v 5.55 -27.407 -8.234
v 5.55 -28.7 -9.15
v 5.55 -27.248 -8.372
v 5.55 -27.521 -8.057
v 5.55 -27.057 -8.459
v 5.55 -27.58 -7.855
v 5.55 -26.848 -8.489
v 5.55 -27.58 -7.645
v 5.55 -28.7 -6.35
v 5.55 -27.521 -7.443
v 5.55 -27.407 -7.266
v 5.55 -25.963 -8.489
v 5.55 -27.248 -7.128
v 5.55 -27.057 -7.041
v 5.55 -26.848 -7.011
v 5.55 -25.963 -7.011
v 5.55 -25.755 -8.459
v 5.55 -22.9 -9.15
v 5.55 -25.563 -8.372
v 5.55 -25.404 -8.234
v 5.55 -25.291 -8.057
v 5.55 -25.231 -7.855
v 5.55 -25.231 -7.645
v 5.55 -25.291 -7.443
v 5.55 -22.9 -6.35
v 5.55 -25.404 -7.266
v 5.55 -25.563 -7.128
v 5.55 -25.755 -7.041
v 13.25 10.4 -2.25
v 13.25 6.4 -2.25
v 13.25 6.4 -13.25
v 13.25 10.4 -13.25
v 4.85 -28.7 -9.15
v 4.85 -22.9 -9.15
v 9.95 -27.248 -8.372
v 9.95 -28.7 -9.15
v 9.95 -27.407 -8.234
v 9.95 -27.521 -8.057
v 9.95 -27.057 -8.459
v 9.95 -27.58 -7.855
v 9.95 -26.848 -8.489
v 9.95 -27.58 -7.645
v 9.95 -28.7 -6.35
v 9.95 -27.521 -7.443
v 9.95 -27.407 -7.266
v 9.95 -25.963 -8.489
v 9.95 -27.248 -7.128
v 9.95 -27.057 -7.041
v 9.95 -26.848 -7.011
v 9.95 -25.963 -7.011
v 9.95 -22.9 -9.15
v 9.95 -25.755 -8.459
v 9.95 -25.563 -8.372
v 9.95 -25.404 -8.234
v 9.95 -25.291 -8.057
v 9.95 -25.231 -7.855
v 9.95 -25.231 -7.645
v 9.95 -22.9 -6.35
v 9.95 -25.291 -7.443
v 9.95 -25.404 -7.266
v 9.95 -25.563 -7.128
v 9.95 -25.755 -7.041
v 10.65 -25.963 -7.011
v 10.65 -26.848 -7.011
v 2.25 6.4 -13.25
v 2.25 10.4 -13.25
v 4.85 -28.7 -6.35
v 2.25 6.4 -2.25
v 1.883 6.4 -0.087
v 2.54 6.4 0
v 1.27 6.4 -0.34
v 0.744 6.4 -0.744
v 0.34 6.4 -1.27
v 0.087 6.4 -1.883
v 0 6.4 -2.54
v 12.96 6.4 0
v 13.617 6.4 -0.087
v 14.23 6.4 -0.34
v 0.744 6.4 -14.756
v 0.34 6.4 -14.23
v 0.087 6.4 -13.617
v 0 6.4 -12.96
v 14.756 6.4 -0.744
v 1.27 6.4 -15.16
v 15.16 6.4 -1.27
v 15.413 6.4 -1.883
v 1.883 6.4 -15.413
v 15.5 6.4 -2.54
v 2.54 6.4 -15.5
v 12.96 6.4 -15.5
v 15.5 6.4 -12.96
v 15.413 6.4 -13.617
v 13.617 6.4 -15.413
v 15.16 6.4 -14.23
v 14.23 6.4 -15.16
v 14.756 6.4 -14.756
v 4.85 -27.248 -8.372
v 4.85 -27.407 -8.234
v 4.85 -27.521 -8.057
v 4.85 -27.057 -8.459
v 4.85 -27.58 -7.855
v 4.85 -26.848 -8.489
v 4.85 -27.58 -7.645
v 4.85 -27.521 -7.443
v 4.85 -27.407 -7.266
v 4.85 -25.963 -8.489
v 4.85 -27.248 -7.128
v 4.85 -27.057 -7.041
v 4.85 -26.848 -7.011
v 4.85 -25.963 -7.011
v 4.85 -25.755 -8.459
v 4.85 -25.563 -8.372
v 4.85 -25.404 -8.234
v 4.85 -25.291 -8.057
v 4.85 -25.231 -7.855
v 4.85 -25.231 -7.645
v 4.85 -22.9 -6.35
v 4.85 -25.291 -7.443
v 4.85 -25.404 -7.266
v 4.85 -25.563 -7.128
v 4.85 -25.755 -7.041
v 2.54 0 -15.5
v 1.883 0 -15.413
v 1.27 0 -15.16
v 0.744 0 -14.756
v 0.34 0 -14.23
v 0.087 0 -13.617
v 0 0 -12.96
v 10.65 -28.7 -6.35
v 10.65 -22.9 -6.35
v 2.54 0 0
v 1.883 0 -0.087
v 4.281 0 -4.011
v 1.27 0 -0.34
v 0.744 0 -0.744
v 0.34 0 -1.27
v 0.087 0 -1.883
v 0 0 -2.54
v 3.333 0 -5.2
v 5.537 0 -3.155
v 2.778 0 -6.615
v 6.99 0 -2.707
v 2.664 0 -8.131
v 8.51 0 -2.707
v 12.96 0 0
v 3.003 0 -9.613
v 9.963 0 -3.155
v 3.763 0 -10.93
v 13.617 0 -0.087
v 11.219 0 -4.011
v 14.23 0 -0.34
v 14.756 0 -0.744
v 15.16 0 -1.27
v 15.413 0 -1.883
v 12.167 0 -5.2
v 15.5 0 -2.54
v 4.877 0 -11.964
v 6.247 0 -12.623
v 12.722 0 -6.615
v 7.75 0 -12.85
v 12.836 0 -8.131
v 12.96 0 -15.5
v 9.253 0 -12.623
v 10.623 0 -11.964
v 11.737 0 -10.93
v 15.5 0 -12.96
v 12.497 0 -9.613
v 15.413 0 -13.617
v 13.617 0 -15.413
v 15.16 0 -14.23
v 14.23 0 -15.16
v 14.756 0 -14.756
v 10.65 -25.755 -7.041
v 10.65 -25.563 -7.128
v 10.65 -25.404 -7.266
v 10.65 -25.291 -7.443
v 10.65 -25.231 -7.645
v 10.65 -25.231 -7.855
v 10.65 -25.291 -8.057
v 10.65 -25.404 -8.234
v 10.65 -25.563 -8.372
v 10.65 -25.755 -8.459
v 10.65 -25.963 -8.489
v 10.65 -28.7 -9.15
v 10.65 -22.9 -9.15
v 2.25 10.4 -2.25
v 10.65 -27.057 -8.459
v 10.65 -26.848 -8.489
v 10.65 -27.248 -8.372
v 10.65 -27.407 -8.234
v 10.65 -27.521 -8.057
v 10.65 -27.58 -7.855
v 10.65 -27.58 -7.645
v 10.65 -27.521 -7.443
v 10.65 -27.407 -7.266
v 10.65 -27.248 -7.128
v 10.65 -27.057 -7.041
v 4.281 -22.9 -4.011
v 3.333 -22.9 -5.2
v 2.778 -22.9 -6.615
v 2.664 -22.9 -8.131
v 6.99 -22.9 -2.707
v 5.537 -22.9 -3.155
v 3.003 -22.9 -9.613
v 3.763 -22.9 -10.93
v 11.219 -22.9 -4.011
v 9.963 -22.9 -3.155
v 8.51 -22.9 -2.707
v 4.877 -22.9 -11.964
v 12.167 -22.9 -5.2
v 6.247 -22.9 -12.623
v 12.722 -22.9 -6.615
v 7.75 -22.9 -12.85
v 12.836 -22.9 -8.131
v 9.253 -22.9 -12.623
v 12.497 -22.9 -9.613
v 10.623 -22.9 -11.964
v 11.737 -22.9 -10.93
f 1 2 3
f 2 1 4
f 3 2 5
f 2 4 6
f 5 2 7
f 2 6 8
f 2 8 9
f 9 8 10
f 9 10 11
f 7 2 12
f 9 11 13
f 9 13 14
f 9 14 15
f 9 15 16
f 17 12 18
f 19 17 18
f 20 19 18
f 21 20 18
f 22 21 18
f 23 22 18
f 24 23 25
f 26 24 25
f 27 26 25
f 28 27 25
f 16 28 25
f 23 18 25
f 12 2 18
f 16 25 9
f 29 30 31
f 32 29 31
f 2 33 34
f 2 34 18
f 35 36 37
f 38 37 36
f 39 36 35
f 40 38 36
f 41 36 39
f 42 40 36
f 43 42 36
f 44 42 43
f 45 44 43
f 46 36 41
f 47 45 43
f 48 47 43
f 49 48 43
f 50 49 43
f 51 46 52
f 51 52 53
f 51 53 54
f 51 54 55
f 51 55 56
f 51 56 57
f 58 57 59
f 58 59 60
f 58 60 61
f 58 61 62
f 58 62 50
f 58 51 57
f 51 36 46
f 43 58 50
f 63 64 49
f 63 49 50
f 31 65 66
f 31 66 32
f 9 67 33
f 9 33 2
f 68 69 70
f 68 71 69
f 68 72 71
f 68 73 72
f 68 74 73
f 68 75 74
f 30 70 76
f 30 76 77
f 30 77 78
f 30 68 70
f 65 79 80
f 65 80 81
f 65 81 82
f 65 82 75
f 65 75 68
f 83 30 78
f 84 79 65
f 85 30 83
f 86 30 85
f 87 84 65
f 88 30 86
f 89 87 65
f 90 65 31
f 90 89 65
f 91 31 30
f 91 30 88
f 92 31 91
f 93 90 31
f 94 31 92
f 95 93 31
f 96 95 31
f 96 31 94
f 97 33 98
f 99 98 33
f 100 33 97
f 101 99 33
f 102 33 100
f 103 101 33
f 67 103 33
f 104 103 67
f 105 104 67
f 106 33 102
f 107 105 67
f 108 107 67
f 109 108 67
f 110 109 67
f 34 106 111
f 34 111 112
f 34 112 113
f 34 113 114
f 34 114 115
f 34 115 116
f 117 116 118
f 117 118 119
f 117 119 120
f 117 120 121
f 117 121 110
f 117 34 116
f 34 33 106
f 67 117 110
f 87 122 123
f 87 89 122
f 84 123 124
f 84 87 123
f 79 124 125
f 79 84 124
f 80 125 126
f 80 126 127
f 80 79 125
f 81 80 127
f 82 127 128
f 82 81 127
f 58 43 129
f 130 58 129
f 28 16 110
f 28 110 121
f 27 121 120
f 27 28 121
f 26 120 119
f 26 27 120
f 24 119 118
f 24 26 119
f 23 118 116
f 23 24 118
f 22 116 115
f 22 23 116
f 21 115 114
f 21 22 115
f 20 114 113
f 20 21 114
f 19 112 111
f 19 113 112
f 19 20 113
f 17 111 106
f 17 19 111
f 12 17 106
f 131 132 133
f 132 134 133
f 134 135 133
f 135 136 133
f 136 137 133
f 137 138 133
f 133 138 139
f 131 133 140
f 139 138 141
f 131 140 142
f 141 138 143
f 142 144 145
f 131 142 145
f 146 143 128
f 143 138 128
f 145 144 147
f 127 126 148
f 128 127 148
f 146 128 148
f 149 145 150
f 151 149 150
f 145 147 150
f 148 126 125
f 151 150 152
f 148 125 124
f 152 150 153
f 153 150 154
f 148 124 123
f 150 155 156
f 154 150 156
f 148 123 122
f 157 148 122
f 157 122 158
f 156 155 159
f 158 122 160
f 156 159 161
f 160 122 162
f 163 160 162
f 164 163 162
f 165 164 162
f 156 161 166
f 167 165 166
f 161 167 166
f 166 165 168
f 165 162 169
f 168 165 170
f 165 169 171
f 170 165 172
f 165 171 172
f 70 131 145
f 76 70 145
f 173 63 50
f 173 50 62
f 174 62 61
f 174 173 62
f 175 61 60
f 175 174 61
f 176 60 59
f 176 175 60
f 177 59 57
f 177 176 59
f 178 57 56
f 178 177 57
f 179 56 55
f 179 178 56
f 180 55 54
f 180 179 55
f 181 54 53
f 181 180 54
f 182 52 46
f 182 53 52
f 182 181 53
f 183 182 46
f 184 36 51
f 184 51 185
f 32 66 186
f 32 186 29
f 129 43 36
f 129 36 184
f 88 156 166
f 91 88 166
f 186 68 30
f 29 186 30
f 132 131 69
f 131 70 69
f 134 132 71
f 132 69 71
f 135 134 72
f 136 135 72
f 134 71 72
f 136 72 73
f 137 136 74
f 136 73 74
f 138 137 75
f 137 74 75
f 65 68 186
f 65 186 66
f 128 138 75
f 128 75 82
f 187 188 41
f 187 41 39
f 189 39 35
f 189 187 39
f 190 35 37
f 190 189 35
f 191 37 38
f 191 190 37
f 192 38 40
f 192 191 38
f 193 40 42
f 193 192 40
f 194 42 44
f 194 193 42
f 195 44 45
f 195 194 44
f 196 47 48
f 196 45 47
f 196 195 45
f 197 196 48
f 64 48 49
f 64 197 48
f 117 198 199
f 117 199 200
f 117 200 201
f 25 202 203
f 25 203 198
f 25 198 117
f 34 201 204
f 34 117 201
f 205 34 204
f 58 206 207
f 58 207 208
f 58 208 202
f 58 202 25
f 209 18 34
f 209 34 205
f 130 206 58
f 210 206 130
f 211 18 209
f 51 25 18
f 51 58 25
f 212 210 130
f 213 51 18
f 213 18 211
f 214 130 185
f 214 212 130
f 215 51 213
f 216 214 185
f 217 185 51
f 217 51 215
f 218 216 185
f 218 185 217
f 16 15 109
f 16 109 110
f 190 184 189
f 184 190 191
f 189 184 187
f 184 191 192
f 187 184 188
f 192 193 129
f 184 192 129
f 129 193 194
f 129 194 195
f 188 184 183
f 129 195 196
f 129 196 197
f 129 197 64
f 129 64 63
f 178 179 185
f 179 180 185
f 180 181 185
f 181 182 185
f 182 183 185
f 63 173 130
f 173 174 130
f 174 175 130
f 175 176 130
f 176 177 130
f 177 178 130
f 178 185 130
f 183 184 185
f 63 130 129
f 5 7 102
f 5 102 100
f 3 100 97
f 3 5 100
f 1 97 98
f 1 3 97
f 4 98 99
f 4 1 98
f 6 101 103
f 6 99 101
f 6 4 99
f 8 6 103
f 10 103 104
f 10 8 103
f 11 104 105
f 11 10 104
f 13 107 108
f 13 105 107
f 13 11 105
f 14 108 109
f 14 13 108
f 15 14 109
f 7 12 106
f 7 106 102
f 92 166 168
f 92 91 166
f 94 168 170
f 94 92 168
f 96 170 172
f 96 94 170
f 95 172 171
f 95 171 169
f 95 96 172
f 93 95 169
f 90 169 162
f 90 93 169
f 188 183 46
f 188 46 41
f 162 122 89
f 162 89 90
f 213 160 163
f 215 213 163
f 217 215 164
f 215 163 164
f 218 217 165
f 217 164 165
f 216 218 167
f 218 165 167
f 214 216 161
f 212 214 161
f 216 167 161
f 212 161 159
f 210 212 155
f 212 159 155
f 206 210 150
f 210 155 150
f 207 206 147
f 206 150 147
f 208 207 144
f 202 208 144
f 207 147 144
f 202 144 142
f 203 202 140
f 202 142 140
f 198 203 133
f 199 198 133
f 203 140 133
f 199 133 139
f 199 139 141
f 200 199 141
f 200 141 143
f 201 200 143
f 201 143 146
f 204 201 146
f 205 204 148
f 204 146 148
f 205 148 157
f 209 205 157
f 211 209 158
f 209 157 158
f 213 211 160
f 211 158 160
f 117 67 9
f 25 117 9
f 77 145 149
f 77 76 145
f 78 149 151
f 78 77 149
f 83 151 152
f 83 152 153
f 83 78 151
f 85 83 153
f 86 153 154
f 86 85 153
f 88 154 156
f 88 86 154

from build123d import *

# Parameters (mm, degrees)
SKETCH1_W           = 15.5
SKETCH1_H           = 15.5
BOSS_EXTRUDE1_DEPTH = 6.4
FILLET1_R           = 2.54
FILLET2_R           = 2.54
FILLET3_R           = 2.54
FILLET4_R           = 2.54
SKETCH2_W           = 11
SKETCH2_H           = 11
BOSS_EXTRUDE2_DEPTH = 4
SKETCH3_R           = 5.1
BOSS_EXTRUDE3_DEPTH = 22.9
SKETCH4_W           = 0.7
SKETCH4_H           = 2.8
BOSS_EXTRUDE4_DEPTH = 5.8
CUT_EXTRUDE1_DEPTH  = 35.312716302


with BuildPart() as part:
    # Sketch1 → Boss-Extrude1 (new body)
    with BuildSketch(Plane(origin=(0, 0, 0), x_dir=(1, 0, 0), z_dir=(0, 1, 0))):
        with Locations((7.75, 7.75)):
            Rectangle(SKETCH1_W, SKETCH1_H)
    extrude(amount=BOSS_EXTRUDE1_DEPTH)

    # Fillet1
    fillet1_edges = [part.edges().sort_by_distance(p)[0] for p in [
        (15.5, 3.2, 0),
    ]]
    fillet(fillet1_edges, radius=FILLET1_R)

    # Fillet2
    fillet2_edges = [part.edges().sort_by_distance(p)[0] for p in [
        (0, 3.2, 0),
    ]]
    fillet(fillet2_edges, radius=FILLET2_R)

    # Fillet3
    fillet3_edges = [part.edges().sort_by_distance(p)[0] for p in [
        (15.5, 3.2, -15.5),
    ]]
    fillet(fillet3_edges, radius=FILLET3_R)

    # Fillet4
    fillet4_edges = [part.edges().sort_by_distance(p)[0] for p in [
        (0, 3.2, -15.5),
    ]]
    fillet(fillet4_edges, radius=FILLET4_R)

    # Sketch2 → Boss-Extrude2 (add)
    with BuildSketch(Plane(origin=(0, 6.4, 0), x_dir=(1, 0, 0), z_dir=(0, 1, 0))):
        with Locations((7.75, 7.75)):
            Rectangle(SKETCH2_W, SKETCH2_H)
    extrude(amount=BOSS_EXTRUDE2_DEPTH)

    # Sketch3 → Boss-Extrude3 (add)
    with BuildSketch(Plane.XZ):
        with Locations(Location((7.75, -7.75, 0), (0, 0, 270))):
            Circle(SKETCH3_R)
    extrude(amount=BOSS_EXTRUDE3_DEPTH)

    # Sketch4 → Boss-Extrude4 (add)
    with BuildSketch(Plane.XZ.offset(22.9)):
        with Locations((5.2, -7.75)):
            Rectangle(SKETCH4_W, SKETCH4_H)
        with Locations((10.3, -7.75)):
            Rectangle(SKETCH4_W, SKETCH4_H)
    extrude(amount=BOSS_EXTRUDE4_DEPTH)

    # Sketch5 → Cut-Extrude1 (cut, through all)
    with BuildSketch(Plane(origin=(10.65, 0, 0), x_dir=(0, 0, -1), z_dir=(1, 0, 0))):
        with BuildLine():
            Line((8.489235797, -25.962974619), (8.489235797, -26.848488265))
            ThreePointArc((8.489235797, -26.848488265), (7.75, -27.587724063), (7.010764203, -26.848488265))
            Line((7.010764203, -26.848488265), (7.010764203, -25.962974619))
            ThreePointArc((7.010764203, -25.962974619), (7.75, -25.223738822), (8.489235797, -25.962974619))
        make_face()
    extrude(amount=-CUT_EXTRUDE1_DEPTH, mode=Mode.SUBTRACT)


solid = part.part
